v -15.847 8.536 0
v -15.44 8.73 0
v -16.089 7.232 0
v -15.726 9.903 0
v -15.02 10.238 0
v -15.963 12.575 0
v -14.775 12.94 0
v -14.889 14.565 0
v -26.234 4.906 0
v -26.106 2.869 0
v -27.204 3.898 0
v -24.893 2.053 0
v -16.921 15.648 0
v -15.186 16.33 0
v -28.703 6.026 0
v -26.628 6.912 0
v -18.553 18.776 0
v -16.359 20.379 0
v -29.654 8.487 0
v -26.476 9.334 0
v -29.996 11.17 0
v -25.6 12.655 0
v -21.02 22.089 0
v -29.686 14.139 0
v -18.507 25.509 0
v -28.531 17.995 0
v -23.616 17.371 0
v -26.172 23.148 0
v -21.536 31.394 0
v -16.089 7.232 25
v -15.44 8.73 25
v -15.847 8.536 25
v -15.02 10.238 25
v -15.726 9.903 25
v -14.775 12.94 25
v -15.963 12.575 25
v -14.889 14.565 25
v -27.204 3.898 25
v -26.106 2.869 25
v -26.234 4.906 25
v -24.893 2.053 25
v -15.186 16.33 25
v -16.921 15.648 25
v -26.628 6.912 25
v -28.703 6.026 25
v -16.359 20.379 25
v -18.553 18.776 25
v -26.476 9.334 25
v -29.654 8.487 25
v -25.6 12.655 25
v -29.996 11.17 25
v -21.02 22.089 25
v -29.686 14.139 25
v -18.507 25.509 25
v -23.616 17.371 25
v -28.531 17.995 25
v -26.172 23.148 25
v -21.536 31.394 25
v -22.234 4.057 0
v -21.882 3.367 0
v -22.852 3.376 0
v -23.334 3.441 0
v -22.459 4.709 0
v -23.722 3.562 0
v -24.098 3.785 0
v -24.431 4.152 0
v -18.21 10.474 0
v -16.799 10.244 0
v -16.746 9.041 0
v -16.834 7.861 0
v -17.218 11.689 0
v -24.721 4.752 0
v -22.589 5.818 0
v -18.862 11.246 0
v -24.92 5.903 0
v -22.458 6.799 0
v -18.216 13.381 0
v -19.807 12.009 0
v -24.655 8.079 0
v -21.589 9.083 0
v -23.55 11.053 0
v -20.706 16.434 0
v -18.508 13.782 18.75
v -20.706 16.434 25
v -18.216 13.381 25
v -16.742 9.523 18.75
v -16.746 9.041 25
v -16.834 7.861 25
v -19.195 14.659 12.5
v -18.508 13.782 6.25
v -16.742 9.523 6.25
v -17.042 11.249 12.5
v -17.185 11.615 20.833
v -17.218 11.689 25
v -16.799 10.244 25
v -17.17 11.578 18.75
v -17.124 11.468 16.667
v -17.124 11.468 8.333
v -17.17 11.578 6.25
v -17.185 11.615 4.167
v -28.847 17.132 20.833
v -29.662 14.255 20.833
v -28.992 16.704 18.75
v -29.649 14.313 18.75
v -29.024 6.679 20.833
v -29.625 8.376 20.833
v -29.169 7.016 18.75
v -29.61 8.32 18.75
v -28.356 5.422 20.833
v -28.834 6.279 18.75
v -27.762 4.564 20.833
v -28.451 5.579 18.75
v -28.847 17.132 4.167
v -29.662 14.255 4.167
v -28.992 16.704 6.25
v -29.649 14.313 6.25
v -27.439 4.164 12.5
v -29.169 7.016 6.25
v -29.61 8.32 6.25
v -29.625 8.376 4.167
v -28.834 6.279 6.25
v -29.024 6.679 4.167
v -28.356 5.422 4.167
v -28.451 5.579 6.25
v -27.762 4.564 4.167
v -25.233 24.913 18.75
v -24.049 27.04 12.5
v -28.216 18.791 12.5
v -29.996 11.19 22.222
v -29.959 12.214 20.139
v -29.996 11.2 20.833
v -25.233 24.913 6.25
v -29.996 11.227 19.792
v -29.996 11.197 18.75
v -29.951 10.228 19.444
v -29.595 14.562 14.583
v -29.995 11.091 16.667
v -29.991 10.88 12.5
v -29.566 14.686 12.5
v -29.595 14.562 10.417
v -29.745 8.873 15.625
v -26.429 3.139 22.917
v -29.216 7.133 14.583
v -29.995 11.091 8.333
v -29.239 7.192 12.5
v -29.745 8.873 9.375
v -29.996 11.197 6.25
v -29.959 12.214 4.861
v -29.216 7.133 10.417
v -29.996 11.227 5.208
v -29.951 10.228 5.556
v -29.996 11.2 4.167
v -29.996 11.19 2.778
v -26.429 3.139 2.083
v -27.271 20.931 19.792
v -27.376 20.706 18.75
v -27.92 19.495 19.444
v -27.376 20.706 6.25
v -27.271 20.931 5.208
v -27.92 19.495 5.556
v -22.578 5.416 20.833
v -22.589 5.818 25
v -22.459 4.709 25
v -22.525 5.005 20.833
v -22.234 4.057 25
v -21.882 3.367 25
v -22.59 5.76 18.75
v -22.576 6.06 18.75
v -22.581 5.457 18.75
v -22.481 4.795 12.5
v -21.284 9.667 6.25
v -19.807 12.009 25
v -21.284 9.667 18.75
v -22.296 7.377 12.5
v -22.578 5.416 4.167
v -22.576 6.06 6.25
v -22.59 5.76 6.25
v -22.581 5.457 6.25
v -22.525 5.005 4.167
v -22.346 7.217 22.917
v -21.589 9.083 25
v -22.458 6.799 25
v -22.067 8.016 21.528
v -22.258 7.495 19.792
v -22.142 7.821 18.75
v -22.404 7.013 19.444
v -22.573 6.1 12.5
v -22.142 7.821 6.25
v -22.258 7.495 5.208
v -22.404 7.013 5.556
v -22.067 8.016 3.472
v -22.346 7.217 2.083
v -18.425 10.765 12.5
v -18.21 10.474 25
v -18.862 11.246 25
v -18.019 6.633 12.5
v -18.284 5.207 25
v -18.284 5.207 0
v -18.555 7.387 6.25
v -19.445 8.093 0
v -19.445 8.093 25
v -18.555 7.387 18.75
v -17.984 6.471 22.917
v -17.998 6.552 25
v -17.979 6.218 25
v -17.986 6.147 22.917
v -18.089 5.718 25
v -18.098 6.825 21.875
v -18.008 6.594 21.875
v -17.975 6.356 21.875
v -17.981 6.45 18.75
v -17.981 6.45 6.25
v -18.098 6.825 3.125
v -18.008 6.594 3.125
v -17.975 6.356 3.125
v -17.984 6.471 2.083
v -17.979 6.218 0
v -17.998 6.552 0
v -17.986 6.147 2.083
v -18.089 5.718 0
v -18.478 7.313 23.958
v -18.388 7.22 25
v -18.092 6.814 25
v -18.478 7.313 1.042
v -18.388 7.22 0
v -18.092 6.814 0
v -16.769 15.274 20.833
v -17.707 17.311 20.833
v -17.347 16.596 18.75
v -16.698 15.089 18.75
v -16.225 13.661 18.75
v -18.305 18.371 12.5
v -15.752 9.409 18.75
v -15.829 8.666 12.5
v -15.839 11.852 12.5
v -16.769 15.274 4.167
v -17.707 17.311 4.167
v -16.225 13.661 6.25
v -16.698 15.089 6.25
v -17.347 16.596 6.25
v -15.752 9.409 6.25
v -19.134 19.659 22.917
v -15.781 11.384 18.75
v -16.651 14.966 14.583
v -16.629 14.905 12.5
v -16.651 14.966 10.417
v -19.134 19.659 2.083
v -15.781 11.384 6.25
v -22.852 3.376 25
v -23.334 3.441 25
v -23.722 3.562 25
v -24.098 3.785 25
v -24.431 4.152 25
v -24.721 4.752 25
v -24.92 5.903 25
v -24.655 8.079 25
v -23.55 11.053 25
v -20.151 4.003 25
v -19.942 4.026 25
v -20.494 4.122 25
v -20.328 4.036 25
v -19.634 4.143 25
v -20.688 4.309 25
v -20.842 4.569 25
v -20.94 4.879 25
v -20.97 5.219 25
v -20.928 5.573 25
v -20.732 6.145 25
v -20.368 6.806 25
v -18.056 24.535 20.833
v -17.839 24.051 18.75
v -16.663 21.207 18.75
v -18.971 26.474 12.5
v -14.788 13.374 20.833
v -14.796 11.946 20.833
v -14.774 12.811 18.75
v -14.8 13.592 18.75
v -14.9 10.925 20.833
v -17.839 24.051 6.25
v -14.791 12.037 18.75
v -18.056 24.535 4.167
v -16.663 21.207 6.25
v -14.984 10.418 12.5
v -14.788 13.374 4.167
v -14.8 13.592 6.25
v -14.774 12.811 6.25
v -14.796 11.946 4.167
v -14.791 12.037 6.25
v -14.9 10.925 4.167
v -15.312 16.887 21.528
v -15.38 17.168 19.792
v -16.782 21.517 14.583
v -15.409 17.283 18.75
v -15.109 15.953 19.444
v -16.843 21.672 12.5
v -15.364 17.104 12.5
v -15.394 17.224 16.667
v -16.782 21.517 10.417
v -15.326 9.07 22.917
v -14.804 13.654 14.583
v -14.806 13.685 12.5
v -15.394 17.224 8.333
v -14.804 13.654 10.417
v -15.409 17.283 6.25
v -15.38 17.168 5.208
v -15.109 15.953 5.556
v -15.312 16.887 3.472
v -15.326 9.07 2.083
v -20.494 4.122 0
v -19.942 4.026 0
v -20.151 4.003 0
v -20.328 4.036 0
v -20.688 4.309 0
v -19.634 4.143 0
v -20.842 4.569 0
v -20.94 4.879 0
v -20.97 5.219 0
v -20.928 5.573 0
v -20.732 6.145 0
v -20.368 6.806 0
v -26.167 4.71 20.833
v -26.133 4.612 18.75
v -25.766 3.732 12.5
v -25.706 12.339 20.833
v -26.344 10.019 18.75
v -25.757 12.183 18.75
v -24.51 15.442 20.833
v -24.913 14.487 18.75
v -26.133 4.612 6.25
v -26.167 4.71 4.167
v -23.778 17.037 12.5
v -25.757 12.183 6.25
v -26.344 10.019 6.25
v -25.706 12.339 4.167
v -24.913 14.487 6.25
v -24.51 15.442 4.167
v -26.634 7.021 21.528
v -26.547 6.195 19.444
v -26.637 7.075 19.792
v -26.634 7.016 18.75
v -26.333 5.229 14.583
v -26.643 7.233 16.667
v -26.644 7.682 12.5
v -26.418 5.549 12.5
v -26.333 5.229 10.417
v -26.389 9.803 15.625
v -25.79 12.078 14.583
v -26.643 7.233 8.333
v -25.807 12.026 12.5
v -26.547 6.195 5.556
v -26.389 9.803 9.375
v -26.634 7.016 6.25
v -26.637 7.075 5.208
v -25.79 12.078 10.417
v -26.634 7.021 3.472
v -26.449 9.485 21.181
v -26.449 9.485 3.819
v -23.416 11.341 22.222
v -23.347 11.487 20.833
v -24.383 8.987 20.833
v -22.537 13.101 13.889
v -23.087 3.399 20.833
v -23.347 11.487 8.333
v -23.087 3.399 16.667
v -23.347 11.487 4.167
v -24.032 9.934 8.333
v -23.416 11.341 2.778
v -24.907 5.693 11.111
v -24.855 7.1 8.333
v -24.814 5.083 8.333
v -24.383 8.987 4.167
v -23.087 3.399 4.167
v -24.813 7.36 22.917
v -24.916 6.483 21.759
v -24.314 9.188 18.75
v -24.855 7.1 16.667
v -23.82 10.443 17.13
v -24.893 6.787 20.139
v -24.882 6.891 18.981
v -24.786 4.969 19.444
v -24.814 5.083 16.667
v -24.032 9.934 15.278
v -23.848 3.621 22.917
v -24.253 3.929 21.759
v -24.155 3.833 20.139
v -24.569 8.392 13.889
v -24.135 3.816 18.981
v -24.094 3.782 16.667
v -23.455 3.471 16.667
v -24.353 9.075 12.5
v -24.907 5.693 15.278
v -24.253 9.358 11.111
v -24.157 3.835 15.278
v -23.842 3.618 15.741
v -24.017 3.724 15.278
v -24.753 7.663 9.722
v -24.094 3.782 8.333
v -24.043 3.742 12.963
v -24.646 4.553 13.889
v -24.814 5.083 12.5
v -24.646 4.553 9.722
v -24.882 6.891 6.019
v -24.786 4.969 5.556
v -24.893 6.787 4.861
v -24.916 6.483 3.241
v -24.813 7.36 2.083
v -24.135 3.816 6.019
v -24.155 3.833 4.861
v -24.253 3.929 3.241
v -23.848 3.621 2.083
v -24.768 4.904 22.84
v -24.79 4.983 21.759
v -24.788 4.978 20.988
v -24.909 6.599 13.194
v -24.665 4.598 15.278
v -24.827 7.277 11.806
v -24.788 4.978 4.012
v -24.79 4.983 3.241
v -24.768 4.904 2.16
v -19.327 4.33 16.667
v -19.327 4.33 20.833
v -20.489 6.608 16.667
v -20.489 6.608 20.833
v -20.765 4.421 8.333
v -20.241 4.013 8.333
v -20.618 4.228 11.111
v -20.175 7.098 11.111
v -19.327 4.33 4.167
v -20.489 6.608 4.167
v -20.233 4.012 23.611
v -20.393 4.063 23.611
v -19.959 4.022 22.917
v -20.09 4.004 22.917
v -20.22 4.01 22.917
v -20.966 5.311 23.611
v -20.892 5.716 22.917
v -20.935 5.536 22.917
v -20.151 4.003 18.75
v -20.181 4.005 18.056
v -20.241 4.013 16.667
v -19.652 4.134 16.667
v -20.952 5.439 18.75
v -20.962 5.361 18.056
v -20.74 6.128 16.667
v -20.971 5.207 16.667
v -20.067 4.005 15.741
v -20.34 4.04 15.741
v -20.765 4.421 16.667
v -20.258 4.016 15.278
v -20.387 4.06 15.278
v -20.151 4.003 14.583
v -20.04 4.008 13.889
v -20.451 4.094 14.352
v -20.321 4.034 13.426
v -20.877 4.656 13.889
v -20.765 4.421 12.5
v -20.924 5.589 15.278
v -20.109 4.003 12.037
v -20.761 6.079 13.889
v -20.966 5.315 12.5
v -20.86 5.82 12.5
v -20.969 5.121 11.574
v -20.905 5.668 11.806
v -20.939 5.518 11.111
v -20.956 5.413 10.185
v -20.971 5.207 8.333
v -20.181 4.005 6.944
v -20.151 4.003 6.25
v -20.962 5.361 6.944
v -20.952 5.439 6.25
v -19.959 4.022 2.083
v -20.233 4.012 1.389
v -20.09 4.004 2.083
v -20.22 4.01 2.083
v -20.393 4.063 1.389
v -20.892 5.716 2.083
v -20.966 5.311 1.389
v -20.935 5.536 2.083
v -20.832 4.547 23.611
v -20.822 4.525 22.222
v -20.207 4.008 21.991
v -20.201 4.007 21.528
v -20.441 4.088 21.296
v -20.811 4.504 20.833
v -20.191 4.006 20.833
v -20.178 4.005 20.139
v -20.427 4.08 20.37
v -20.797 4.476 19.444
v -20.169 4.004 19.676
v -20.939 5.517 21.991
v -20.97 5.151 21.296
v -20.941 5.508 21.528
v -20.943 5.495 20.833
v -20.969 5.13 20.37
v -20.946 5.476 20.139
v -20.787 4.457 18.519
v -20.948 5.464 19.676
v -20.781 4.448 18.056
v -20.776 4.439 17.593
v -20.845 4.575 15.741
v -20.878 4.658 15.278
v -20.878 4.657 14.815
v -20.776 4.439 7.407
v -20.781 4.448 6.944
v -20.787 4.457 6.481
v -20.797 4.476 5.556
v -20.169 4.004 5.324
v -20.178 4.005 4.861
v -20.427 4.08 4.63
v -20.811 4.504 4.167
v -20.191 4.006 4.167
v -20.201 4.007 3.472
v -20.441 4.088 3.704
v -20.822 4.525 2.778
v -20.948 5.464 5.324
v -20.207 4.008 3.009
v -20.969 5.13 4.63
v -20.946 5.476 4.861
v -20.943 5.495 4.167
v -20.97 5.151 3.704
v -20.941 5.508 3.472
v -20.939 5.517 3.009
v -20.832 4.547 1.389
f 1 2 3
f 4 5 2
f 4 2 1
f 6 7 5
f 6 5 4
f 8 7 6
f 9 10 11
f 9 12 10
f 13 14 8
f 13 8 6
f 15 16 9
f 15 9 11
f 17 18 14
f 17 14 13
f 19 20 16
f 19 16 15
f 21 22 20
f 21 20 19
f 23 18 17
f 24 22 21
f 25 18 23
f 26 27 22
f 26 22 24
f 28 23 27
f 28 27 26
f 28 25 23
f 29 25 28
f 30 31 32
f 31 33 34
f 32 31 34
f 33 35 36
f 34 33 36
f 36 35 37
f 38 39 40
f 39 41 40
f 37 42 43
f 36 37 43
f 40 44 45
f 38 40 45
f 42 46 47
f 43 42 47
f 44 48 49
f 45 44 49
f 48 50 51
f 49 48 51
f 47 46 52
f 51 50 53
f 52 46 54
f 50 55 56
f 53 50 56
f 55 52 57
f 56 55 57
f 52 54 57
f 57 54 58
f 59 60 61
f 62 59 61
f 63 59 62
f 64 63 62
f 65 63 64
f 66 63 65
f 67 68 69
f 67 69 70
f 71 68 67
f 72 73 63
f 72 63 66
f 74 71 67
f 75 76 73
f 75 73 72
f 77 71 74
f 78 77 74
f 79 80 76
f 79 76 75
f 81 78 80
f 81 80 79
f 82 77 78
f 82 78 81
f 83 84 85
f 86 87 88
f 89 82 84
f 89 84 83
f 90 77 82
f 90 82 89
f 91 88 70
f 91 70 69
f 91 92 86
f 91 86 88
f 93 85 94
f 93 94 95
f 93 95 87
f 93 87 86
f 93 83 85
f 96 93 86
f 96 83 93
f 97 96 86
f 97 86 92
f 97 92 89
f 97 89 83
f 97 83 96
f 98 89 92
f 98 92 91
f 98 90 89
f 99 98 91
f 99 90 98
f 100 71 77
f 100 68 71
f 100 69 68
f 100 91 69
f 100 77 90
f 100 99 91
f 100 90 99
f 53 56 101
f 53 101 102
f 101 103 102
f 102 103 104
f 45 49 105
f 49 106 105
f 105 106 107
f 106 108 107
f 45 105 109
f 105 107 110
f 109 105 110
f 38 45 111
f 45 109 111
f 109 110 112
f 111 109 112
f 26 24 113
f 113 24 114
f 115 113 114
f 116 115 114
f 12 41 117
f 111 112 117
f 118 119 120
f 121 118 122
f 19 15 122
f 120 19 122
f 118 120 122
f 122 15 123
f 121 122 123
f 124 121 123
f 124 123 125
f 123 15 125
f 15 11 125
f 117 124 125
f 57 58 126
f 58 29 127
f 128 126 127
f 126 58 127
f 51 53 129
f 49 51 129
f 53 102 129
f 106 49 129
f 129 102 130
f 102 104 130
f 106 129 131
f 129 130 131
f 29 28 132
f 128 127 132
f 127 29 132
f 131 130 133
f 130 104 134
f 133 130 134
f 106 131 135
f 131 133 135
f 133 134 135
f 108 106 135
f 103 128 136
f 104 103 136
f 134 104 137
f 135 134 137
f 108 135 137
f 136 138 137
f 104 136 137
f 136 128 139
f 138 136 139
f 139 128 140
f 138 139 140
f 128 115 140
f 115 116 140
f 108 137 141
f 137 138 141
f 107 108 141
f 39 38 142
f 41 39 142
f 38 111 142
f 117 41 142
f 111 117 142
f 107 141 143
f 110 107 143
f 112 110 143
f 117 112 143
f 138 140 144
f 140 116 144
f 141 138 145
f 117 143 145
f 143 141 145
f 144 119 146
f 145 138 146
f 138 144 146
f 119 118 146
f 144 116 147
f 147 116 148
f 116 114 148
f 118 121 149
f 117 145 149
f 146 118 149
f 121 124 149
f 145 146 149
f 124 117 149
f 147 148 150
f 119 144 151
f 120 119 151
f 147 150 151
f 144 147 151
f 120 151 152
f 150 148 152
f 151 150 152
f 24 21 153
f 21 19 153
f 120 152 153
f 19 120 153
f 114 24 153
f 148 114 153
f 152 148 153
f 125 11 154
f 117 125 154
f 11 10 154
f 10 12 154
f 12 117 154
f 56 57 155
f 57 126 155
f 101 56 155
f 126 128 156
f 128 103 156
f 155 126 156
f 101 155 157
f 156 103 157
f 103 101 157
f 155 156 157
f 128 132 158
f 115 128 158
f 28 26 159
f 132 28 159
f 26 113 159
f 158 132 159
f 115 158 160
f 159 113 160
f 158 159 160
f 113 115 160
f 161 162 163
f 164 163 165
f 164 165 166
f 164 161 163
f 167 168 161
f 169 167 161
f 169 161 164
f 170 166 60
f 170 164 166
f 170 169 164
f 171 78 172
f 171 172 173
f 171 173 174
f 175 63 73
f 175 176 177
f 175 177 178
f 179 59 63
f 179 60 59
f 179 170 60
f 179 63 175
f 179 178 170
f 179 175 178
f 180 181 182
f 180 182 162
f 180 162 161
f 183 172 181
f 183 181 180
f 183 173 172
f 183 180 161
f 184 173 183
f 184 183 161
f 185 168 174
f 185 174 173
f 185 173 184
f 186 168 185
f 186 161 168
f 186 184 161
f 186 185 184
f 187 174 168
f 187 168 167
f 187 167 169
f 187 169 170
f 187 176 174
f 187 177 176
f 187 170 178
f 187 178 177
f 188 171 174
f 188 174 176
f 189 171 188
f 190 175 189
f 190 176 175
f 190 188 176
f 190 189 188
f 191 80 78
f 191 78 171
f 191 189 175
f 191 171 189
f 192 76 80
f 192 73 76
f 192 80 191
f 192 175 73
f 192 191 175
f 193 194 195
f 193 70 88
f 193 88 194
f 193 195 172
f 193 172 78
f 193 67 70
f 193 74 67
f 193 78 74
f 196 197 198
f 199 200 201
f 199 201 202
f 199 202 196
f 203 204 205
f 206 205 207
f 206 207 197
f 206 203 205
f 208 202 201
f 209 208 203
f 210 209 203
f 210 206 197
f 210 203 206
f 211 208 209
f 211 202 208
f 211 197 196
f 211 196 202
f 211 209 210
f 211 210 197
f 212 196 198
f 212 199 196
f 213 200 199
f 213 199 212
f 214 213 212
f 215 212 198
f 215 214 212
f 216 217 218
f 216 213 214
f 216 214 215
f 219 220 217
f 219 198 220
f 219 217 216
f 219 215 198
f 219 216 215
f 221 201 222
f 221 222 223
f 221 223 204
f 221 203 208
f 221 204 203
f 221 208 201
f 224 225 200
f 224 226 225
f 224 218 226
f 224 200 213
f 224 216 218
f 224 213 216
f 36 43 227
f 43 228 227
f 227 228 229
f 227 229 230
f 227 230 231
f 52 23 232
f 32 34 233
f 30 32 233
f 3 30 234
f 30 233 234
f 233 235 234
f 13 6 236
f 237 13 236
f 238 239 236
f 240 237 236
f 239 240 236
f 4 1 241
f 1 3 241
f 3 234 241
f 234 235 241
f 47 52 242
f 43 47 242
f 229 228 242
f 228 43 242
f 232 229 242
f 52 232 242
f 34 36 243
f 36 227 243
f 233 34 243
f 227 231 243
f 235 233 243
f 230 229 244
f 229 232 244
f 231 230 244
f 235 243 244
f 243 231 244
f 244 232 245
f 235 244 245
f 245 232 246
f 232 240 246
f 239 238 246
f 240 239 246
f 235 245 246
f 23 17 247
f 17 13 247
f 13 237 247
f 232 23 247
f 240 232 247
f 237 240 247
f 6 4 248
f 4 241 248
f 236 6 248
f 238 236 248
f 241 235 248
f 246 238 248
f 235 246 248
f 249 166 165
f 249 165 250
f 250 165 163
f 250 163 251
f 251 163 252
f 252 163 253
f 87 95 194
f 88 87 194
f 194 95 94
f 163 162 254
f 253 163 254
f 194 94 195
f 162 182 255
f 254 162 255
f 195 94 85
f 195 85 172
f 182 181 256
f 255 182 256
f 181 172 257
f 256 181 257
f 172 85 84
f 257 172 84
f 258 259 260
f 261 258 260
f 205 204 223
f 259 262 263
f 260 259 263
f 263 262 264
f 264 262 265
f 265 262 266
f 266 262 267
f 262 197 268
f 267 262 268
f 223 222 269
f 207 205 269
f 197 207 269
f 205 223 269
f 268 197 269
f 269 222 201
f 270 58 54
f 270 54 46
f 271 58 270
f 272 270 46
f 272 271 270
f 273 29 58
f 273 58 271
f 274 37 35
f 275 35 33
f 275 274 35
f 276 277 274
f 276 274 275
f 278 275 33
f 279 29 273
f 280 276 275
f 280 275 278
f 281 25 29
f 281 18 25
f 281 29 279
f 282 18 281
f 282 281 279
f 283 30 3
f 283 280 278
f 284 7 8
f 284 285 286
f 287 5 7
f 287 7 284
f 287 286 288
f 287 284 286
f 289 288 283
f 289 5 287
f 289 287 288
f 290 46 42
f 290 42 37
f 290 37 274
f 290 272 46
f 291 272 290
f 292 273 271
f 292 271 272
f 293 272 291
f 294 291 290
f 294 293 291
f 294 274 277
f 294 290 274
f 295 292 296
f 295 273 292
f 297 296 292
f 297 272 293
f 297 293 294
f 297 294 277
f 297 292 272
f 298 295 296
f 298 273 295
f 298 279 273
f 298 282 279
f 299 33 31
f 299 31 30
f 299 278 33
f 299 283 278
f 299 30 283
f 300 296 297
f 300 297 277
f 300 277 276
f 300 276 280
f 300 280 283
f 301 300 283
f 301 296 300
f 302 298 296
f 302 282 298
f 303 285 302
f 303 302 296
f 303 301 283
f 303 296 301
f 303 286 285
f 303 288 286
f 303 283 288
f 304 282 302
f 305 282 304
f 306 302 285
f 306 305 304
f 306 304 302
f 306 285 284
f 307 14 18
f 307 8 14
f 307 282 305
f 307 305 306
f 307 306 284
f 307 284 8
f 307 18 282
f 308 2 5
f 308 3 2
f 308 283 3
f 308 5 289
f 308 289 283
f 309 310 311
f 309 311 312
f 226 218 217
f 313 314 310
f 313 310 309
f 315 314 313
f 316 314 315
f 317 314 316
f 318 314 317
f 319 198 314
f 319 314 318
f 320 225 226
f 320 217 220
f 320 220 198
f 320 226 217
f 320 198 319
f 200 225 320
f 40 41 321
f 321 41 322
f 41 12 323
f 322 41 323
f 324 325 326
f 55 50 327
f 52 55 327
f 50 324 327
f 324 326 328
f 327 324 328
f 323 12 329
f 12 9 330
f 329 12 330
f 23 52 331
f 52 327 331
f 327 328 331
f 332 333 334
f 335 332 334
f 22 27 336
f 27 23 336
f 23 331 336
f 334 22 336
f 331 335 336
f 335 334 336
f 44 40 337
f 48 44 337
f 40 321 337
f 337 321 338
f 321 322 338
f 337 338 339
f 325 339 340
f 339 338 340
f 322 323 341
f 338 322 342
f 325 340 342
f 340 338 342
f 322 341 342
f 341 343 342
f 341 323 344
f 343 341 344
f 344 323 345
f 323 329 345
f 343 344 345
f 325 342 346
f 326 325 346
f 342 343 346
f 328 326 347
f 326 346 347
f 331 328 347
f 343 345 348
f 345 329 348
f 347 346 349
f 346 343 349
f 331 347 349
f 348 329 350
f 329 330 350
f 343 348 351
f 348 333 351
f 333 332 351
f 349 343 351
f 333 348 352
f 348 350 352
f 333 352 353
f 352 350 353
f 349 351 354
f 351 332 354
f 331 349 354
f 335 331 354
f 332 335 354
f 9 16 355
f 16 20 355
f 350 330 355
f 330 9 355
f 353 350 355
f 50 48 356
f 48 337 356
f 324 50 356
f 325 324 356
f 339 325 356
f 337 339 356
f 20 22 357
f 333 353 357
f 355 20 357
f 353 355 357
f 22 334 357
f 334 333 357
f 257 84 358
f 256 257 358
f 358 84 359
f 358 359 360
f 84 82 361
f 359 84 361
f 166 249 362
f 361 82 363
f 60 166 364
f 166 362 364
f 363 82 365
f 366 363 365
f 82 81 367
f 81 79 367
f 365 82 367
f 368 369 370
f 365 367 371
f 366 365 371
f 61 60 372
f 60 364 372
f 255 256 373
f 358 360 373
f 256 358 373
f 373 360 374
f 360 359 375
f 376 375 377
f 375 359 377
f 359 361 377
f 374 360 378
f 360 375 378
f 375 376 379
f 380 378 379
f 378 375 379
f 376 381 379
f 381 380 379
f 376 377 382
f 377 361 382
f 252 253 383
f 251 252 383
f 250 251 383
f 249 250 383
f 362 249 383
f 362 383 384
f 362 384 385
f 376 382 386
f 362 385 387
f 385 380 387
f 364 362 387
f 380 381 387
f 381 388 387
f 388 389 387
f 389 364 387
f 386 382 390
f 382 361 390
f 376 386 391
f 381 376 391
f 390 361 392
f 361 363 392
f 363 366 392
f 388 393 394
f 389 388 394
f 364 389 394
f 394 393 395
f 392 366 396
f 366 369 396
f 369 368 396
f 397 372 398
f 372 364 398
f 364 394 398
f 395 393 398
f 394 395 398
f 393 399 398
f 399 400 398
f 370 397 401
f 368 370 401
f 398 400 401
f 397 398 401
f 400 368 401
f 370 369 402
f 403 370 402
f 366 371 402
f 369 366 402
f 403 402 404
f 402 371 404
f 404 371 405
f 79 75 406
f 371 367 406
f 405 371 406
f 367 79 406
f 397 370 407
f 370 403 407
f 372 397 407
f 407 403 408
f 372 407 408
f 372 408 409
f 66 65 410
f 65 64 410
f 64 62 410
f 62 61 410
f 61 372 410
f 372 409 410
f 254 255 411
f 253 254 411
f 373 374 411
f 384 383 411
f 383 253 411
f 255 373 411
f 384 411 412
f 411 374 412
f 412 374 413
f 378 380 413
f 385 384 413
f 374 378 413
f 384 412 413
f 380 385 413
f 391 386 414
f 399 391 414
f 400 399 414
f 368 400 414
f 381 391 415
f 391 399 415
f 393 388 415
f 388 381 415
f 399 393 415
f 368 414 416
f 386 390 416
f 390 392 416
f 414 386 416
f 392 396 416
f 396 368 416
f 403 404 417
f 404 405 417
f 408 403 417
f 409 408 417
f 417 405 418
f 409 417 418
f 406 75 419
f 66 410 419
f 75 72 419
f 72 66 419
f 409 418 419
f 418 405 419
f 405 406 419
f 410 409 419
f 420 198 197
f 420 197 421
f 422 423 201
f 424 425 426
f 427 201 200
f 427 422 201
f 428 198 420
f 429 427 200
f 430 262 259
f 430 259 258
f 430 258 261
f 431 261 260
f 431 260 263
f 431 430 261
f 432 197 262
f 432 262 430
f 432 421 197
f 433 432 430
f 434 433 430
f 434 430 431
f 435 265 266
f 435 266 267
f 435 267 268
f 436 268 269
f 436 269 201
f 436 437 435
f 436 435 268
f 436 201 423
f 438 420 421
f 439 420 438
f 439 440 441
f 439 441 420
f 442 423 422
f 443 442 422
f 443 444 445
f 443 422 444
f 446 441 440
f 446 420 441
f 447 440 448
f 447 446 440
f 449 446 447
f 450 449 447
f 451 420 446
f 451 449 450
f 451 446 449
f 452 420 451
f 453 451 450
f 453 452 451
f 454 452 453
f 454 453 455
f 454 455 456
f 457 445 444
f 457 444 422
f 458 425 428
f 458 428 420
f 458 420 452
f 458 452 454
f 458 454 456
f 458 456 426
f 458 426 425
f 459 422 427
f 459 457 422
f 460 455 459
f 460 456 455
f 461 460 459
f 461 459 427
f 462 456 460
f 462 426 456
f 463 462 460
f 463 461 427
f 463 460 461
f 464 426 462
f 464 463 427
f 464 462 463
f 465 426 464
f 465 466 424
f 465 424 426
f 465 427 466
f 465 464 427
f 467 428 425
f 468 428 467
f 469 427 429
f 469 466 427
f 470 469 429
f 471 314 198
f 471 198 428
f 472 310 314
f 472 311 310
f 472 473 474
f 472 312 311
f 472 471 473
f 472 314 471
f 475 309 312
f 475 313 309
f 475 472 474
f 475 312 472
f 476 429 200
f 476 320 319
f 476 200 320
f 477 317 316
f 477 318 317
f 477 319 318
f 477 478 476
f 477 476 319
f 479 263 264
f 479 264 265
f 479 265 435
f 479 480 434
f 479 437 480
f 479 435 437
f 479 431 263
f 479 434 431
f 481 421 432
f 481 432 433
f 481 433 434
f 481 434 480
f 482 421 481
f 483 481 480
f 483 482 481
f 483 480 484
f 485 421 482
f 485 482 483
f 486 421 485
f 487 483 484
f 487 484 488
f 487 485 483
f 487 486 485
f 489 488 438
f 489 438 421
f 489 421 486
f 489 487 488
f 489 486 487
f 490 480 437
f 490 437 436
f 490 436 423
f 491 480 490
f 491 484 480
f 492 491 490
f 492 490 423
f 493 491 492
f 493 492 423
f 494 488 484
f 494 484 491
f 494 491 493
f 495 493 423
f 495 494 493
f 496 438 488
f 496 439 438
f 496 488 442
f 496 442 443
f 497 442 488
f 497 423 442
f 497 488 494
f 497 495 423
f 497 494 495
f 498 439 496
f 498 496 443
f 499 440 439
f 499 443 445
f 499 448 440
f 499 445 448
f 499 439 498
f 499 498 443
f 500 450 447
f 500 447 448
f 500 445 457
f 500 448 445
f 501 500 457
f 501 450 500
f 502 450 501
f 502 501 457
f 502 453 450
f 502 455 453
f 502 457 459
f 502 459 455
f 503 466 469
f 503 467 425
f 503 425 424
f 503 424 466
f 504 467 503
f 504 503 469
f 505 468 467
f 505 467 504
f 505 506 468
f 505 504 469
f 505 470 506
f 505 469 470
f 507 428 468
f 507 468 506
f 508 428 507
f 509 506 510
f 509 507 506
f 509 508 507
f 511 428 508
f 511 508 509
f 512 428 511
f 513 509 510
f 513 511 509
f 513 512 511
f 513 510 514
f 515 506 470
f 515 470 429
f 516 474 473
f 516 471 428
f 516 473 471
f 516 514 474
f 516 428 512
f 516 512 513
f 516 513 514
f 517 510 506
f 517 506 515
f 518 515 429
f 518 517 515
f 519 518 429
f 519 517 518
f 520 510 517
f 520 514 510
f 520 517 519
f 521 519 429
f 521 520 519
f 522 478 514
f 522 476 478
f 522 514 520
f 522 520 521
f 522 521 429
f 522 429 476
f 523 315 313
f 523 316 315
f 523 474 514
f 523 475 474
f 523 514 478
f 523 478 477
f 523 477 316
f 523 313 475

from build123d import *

# Parameters (mm, degrees)
F1_DEPTH = 25


with BuildPart() as f1:
    # F0 (on Top) → F1 (new body)
    with BuildSketch(Plane.XY):
        with BuildLine():
            add(Edge.make_bspline(
                [(-20.7061469555, 16.4344552904), (-19.1591746798, 14.6528130839), (-16.4811611661, 11.5685548971), (-16.7294171966, 8.9619053509), (-16.8342664838, 7.861004211)],
                knots=[0, 0, 0, 0, 0.5776566353, 1, 1, 1, 1], degree=3))
            add(Edge.make_bspline(
                [(-20.7061469555, 16.4344552904), (-22.5929795945, 13.0733857486), (-25.5691755523, 7.7718018255), (-24.5494545724, 3.3112060098), (-22.7075583132, 3.3496265036), (-21.8815393746, 3.366856603)],
                knots=[0, 0, 0, 0, 0.4885677764, 0.7706425102, 1, 1, 1, 1], degree=3))
            add(Edge.make_bspline(
                [(-19.8073182255, 12.0094493032), (-20.9002914306, 10.4606493601), (-22.6311950908, 7.4484306138), (-22.7803699672, 4.887952935), (-21.8815393746, 3.366856603)],
                knots=[0, 0, 0, 0, 0.5331695338, 1, 1, 1, 1], degree=3))
            add(Edge.make_bspline(
                [(-16.8342664838, 7.861004211), (-17.3401036173, 8.9474453341), (-18.225119819, 10.8482903539), (-19.3327582175, 11.6611746506), (-19.8073182255, 12.0094493032)],
                knots=[0, 0, 0, 0, 0.5715569191, 1, 1, 1, 1], degree=3))
        make_face()
    extrude(amount=F1_DEPTH)


with BuildPart() as f1b:
    # F0 (on Top) → F1, piece 2 (new body)
    with BuildSketch(Plane.XY):
        with BuildLine():
            add(Edge.make_bspline(
                [(-19.4447916001, 8.0927079543), (-18.8119530705, 7.627226052), (-17.6455276569, 6.7692664068), (-18.0835286407, 5.69738537), (-18.2838942856, 5.2070482634)],
                knots=[0, 0, 0, 0, 0.5425452174, 1, 1, 1, 1], degree=3))
            add(Edge.make_bspline(
                [(-18.2838942856, 5.2070482634), (-18.9934483277, 4.5599760742), (-20.2573749934, 3.4073481615), (-21.4581117132, 5.4414249695), (-20.2031736614, 7.094016568), (-19.4447916001, 8.0927079543)],
                knots=[0, 0, 0, 0, 0.3361841626, 0.5988439252, 1, 1, 1, 1], degree=3))
        make_face()
    extrude(amount=F1_DEPTH)


with BuildPart() as f1c:
    # F0 (on Top) → F1, piece 3 (new body)
    with BuildSketch(Plane.XY):
        with BuildLine():
            add(Edge.make_bspline(
                [(-21.5364079922, 31.3943661749), (-18.8223791321, 26.453914754), (-14.5529853201, 17.5787333628), (-14.458286576, 10.4017192498), (-16.0886440426, 7.2315796278)],
                knots=[0, 0, 0, 0, 0.5563391757, 1, 1, 1, 1], degree=3))
            add(Edge.make_bspline(
                [(-21.5364079922, 31.3943661749), (-25.9413516483, 23.8123130141), (-33.0457412626, 11.8537808402), (-27.7093816549, 3.6200170871), (-24.893226102, 2.0532754716)],
                knots=[0, 0, 0, 0, 0.5960190783, 1, 1, 1, 1], degree=3))
            add(Edge.make_bspline(
                [(-24.893226102, 2.0532754716), (-25.8090688548, 3.7216586826), (-28.1394130509, 7.9437440431), (-23.9900499582, 17.2232724726), (-21.0201647133, 22.088829428)],
                knots=[0, 0, 0, 0, 0.3817066551, 1, 1, 1, 1], degree=3))
            add(Edge.make_bspline(
                [(-21.0201647133, 22.088829428), (-17.7343320101, 18.2974878699), (-15.2859570615, 12.3266708745), (-15.7761164771, 8.6500617784), (-16.0886440426, 7.2315796278)],
                knots=[0, 0, 0, 0, 0.6115935899, 1, 1, 1, 1], degree=3))
        make_face()
    extrude(amount=F1_DEPTH)


solid = Compound([f1.part, f1b.part, f1c.part])
